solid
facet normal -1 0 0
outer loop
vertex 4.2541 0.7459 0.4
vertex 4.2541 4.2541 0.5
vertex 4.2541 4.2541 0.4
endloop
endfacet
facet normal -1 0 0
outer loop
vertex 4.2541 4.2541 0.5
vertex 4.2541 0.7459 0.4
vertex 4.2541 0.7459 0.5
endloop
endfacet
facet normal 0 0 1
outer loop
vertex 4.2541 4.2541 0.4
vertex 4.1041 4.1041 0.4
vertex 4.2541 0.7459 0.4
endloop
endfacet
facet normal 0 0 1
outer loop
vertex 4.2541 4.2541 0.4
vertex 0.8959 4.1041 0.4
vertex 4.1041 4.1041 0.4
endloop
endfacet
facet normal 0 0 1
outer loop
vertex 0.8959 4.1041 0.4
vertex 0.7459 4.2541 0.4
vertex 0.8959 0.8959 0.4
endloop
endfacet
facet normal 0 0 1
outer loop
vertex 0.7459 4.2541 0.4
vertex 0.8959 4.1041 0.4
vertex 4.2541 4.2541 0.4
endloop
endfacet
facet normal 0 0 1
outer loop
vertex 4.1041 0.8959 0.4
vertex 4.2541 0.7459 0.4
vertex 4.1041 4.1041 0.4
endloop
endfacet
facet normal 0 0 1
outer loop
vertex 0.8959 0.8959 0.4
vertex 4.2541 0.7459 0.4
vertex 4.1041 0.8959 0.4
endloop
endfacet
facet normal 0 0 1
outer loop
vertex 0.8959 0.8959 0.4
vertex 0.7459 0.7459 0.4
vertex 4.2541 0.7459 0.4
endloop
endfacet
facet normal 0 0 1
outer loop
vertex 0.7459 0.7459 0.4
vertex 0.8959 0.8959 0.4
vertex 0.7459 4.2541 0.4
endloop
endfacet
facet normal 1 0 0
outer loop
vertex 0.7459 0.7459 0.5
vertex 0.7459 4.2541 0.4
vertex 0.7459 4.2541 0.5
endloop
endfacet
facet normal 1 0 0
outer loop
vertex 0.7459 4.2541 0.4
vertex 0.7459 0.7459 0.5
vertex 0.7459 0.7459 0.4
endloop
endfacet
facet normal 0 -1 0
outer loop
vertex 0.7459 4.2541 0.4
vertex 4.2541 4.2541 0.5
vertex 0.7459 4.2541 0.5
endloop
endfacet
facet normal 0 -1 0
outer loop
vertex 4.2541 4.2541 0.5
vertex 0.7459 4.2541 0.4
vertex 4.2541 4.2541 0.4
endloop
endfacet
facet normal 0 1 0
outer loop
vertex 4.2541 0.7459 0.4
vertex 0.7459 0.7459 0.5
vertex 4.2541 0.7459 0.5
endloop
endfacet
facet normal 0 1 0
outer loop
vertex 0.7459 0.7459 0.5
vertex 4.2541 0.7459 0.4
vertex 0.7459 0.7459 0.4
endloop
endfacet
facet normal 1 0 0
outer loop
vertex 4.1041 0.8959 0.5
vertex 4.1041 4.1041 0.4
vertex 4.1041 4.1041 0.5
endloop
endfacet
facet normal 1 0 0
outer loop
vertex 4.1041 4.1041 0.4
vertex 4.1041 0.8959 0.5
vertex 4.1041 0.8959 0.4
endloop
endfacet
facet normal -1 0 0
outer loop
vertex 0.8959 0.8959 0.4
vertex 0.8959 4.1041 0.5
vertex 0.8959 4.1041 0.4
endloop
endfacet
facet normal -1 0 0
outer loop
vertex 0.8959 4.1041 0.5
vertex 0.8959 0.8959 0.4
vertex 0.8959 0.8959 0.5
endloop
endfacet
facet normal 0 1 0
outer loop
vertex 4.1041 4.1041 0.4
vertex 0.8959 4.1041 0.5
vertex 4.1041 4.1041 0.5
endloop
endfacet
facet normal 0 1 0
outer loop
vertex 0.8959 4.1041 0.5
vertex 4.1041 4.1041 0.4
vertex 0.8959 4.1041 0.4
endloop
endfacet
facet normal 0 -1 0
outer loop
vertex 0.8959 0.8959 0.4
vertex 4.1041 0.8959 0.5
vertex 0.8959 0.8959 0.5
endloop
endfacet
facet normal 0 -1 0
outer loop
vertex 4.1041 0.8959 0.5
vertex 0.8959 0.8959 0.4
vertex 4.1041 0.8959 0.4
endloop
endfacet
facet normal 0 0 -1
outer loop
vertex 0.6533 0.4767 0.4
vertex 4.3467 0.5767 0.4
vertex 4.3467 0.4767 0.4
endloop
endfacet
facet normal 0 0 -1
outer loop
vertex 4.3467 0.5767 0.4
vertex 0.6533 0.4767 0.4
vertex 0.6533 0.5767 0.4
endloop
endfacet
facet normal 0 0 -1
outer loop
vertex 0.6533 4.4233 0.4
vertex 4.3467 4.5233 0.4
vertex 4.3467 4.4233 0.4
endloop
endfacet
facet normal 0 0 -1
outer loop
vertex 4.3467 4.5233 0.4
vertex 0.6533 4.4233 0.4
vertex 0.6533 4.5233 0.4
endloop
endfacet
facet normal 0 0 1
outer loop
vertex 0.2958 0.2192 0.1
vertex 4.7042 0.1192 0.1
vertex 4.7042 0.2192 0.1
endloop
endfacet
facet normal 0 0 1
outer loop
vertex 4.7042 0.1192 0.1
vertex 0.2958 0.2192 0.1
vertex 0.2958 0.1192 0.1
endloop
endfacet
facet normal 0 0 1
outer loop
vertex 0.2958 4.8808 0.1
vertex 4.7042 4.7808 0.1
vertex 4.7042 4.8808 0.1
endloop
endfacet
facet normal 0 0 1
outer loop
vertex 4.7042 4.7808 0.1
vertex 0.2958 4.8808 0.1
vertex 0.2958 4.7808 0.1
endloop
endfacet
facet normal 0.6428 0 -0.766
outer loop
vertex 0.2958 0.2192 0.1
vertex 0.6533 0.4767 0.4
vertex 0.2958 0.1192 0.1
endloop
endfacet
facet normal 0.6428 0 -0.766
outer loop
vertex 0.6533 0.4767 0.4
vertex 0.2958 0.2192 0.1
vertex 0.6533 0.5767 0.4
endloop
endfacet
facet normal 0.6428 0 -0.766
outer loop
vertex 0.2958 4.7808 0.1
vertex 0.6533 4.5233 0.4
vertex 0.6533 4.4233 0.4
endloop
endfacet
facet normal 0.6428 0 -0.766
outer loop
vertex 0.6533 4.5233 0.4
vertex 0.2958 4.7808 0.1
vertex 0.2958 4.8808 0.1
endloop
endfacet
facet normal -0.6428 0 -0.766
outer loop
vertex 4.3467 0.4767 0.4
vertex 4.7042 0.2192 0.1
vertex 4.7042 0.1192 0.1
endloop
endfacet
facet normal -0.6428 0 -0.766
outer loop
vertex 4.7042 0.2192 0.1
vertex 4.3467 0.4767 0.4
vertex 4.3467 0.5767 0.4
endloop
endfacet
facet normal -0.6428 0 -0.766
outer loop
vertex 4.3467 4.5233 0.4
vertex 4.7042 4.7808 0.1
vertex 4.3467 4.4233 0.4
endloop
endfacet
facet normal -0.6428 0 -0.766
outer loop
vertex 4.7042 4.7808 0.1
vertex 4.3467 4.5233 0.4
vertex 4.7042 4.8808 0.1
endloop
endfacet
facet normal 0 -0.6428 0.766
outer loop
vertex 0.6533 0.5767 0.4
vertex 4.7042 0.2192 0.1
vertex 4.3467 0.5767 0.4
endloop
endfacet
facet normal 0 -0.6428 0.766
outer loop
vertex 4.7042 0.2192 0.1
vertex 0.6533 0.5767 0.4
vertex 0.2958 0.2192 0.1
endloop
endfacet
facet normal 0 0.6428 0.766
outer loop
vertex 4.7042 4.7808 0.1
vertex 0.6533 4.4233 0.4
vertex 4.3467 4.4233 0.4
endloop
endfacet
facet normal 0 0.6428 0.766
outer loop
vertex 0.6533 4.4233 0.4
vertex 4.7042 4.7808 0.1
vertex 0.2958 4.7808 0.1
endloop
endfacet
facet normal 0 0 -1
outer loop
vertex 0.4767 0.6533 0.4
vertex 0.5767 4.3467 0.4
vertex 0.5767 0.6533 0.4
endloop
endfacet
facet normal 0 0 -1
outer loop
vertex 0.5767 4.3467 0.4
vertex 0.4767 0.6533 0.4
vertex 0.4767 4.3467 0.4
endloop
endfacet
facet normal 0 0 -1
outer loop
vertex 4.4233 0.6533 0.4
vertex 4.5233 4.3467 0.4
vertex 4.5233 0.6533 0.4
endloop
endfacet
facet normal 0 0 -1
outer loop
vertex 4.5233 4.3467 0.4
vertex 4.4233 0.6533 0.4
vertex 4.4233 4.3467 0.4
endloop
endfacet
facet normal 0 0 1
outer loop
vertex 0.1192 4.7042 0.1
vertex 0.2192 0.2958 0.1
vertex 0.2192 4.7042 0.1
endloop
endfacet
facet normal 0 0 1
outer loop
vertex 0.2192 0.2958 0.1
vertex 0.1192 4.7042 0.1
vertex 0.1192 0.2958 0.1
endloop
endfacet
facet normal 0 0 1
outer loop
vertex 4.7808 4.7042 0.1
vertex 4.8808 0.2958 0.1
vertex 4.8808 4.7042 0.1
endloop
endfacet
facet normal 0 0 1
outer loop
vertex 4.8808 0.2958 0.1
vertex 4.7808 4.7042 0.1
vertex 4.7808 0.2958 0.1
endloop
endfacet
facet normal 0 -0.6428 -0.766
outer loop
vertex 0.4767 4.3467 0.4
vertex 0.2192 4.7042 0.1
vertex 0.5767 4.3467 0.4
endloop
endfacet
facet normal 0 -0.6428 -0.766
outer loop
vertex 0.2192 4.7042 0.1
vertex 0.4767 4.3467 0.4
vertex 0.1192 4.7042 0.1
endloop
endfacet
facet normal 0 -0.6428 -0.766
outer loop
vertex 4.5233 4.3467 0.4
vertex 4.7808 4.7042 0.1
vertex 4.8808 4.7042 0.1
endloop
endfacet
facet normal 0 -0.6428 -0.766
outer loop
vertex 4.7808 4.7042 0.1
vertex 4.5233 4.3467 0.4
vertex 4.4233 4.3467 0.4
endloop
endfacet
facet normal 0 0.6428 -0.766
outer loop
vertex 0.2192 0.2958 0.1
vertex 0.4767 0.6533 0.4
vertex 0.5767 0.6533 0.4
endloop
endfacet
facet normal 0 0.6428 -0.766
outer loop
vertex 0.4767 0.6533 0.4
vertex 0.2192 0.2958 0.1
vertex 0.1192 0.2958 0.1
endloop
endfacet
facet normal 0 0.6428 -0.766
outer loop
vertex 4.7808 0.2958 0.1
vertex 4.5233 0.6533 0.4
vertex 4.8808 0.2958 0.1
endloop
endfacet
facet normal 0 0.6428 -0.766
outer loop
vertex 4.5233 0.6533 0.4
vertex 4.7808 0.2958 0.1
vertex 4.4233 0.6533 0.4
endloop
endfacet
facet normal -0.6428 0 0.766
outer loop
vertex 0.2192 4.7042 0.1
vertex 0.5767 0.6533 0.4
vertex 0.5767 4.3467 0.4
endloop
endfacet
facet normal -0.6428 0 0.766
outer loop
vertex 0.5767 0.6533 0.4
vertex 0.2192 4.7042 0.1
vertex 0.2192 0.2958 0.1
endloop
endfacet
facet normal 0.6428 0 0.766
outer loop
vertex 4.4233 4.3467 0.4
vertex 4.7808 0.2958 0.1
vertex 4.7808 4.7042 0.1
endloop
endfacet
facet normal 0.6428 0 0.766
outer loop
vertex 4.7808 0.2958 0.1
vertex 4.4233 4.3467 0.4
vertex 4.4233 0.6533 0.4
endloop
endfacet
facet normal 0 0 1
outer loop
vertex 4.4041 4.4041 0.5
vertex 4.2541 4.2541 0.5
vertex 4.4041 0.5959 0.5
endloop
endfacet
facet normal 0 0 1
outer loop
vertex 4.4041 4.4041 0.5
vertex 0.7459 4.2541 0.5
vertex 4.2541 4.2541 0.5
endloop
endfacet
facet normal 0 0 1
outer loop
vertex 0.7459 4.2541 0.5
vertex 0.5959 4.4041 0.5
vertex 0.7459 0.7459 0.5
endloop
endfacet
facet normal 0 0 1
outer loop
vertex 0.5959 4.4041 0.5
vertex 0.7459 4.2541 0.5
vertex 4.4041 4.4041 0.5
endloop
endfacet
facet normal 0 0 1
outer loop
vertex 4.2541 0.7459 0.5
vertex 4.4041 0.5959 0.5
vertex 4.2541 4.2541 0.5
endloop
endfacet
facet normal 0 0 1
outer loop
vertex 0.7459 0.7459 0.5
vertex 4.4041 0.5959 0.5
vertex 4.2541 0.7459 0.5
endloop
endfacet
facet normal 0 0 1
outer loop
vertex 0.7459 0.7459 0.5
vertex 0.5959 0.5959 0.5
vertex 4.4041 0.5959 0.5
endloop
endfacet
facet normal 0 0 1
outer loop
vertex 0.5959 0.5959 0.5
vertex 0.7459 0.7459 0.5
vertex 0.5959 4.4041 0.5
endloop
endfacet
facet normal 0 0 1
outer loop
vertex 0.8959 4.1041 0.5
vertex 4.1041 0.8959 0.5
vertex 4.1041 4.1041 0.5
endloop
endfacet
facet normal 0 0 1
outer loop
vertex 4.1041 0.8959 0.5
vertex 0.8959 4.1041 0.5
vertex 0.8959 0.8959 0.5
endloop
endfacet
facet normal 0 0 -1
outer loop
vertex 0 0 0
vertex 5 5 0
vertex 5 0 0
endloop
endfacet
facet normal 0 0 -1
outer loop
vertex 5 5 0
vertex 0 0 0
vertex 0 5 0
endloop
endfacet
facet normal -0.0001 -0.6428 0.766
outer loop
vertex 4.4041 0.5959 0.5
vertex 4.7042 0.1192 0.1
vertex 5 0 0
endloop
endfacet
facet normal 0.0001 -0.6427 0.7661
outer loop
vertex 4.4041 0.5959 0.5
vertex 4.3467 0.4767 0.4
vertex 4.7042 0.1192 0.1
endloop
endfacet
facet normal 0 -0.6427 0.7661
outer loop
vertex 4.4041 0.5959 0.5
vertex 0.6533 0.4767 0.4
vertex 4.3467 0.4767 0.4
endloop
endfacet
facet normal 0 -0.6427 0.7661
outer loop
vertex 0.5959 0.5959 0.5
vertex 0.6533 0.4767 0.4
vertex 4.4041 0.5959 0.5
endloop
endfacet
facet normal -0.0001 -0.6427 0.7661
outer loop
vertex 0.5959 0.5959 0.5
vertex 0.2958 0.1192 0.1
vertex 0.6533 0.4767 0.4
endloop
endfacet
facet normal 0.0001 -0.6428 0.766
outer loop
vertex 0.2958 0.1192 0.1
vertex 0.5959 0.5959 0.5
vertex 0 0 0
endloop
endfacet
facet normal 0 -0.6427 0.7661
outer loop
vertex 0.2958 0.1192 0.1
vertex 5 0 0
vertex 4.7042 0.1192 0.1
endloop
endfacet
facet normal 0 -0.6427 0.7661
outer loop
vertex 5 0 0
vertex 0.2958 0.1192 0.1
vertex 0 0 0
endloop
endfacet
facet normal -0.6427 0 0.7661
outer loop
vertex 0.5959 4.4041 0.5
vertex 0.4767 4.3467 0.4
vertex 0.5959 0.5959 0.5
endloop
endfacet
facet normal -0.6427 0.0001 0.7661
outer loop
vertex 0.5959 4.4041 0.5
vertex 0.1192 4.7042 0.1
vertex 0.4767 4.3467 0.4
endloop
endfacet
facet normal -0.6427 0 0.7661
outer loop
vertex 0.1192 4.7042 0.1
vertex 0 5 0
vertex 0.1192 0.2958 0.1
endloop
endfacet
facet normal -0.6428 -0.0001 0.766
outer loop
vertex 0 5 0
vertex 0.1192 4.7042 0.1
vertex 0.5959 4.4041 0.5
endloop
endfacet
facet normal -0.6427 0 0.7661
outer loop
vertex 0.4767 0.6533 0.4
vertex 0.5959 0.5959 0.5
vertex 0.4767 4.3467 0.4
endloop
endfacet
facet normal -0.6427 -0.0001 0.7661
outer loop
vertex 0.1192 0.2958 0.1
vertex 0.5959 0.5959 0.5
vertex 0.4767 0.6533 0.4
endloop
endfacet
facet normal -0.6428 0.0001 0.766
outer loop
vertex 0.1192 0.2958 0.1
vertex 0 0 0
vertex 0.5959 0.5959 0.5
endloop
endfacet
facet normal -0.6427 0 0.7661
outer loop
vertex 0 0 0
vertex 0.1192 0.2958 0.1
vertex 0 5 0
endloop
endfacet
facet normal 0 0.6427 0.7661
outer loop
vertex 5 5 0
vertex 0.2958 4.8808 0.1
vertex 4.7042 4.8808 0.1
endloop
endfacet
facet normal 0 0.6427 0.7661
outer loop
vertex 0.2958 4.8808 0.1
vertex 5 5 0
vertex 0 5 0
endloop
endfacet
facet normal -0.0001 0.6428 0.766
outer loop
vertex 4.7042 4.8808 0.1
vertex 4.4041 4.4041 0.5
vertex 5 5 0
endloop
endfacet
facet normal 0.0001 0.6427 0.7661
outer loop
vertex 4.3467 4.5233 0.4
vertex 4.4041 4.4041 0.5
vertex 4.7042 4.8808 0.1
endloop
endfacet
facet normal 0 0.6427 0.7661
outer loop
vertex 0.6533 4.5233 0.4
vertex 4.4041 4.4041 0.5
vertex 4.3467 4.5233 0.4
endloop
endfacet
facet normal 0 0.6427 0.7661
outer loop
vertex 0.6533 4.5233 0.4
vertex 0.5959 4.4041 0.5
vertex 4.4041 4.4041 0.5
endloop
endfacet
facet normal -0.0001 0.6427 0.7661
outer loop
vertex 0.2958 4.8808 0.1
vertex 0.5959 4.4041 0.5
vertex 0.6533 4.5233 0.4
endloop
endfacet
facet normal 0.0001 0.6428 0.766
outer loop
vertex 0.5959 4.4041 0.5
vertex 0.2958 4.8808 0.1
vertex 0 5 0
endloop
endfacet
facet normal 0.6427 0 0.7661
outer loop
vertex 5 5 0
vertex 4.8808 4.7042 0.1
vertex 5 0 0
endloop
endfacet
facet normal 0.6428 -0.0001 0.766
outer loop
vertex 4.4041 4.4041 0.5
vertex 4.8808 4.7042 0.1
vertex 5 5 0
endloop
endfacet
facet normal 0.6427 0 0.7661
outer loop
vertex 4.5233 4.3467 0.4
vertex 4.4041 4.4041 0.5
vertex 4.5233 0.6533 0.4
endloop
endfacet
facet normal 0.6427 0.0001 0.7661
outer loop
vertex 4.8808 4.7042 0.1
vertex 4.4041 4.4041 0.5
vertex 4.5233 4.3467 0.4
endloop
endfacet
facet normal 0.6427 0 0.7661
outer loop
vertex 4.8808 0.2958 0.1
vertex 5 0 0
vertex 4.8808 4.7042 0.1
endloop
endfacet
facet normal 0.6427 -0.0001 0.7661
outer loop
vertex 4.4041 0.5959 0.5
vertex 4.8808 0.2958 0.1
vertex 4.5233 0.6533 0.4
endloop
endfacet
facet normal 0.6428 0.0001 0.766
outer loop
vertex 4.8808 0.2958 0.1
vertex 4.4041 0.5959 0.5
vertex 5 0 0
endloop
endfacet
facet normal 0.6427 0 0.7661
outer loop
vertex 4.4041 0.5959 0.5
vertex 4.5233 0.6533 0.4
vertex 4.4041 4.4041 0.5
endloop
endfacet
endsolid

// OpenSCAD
lenght = 5; 
width = 5;
height = 0.5;

//The angle of the side
degree = 50; // [1:89]

//The depth of the top cutout
depth = .1;
//The margin between the platform and the top cutout
margin = .15;
//The width of the top cutout
innerWidth = .15;
//The width of the side sticks
marginSide = .1;
//The depth of the side cutout
depthSide = .1;

/* [Hidden] */

offset = tan(degree)*height;


difference() {
   cube([lenght,width,height]);

rotate([-degree,0,0]) {
translate([-1,-1*height*width,0]) {
    
       cube([lenght+2,height*width,height*10]); 
    } 
}

rotate([0,degree,0]) {
translate([-1*lenght*height,-1,0]) {
    
       cube([lenght*height,width+2,height*10]); 
    } 
}

translate([0,width,0]){
    rotate([degree,0,0]) {
    translate([-1,0,0]) {
        
           cube([lenght+2,height*width,height*10]); 
        } 
    }
}

translate([lenght,0,0]) {
    rotate([0,-degree,0]) {
    translate([0,-1,0]) {
        
           cube([lenght*height,width+2,height*10]); 
        } 
    }
}

difference() {
translate([offset+margin,offset+margin,height-depth]) {
cube([lenght - 2*offset - margin*2, width-2*offset - margin*2, height]);
}

translate([offset+margin+innerWidth,offset+margin+innerWidth,height-depth-1]) {
cube([lenght - 2*offset - margin*2-2*innerWidth, width-2*offset - margin*2-2*innerWidth, height+2]);
}


}

//FRONT
intersection() {
difference() {
translate([0,0,marginSide]) {
cube([lenght, width, height-2*marginSide]); 
}
translate([marginSide+marginSide*sin(degree),0,0]) {
rotate([0,degree,0]) {
translate([-1*lenght*height,-1,0]) {
    
       cube([lenght*height,width+2,height*10]); 
    } 
}
}
translate([-1*(marginSide+marginSide*sin(degree)),0,0]) {
translate([lenght,0,0]) {
    rotate([0,-degree,0]) {
    translate([0,-1,0]) {
        
           cube([lenght*height,width+2,height*10]); 
        } 
    }
}
}
}

translate([0,depthSide,0]) {
rotate([-degree,0,0]) {
translate([-1,-1*height*width,0]) {
    
       cube([lenght+2,height*width,height*10]); 
    } 
}
}
}


//BACK
intersection() {
    difference() {
translate([0,0,marginSide]) {
cube([lenght, width, height-2*marginSide]); 
}
translate([marginSide+marginSide*sin(degree),0,0]) {
rotate([0,degree,0]) {
translate([-1*lenght*height,-1,0]) {
    
       cube([lenght*height,width+2,height*10]); 
    } 
}
}
translate([-1*(marginSide+marginSide*sin(degree)),0,0]) {
translate([lenght,0,0]) {
    rotate([0,-degree,0]) {
    translate([0,-1,0]) {
        
           cube([lenght*height,width+2,height*10]); 
        } 
    }
}
}
}
translate([0,-depthSide,0]) {
translate([0,width,0]){
    rotate([degree,0,0]) {
    translate([-1,0,0]) {
        
           cube([lenght+2,height*width,height*10]); 
        } 
    }
}
}

}



//LEFT
intersection() {
difference() {
translate([0,0,marginSide]) {
cube([lenght, width, height-2*marginSide]); 
}

translate([0,-1*(marginSide+marginSide*sin(degree)),0]) {
translate([0,width,0]){
    rotate([degree,0,0]) {
    translate([-1,0,0]) {
        
           cube([lenght+2,height*width,height*10]); 
        } 
    }
}
}
translate([0,marginSide+marginSide*sin(degree),0]) {
rotate([-degree,0,0]) {
translate([-1,-1*height*width,0]) {
    
       cube([lenght+2,height*width,height*10]); 
    } 
}
}
}
translate([depthSide,0,0]) {
rotate([0,degree,0]) {
translate([-1*lenght*height,-1,0]) {
    
       cube([lenght*height,width+2,height*10]); 
    } 
}
}
}
//RIGHT
intersection() {
difference() {
translate([0,0,marginSide]) {
cube([lenght, width, height-2*marginSide]); 
}

translate([0,-1*(marginSide+marginSide*sin(degree)),0]) {
translate([0,width,0]){
    rotate([degree,0,0]) {
    translate([-1,0,0]) {
        
           cube([lenght+2,height*width,height*10]); 
        } 
    }
}
}
translate([0,marginSide+marginSide*sin(degree),0]) {
rotate([-degree,0,0]) {
translate([-1,-1*height*width,0]) {
    
       cube([lenght+2,height*width,height*10]); 
    } 
}
}
}
translate([lenght-depthSide,0,0]) {
    rotate([0,-degree,0]) {
    translate([0,-1,0]) {
        
           cube([lenght*height,width+2,height*10]); 
        } 
    }
}
}
}
